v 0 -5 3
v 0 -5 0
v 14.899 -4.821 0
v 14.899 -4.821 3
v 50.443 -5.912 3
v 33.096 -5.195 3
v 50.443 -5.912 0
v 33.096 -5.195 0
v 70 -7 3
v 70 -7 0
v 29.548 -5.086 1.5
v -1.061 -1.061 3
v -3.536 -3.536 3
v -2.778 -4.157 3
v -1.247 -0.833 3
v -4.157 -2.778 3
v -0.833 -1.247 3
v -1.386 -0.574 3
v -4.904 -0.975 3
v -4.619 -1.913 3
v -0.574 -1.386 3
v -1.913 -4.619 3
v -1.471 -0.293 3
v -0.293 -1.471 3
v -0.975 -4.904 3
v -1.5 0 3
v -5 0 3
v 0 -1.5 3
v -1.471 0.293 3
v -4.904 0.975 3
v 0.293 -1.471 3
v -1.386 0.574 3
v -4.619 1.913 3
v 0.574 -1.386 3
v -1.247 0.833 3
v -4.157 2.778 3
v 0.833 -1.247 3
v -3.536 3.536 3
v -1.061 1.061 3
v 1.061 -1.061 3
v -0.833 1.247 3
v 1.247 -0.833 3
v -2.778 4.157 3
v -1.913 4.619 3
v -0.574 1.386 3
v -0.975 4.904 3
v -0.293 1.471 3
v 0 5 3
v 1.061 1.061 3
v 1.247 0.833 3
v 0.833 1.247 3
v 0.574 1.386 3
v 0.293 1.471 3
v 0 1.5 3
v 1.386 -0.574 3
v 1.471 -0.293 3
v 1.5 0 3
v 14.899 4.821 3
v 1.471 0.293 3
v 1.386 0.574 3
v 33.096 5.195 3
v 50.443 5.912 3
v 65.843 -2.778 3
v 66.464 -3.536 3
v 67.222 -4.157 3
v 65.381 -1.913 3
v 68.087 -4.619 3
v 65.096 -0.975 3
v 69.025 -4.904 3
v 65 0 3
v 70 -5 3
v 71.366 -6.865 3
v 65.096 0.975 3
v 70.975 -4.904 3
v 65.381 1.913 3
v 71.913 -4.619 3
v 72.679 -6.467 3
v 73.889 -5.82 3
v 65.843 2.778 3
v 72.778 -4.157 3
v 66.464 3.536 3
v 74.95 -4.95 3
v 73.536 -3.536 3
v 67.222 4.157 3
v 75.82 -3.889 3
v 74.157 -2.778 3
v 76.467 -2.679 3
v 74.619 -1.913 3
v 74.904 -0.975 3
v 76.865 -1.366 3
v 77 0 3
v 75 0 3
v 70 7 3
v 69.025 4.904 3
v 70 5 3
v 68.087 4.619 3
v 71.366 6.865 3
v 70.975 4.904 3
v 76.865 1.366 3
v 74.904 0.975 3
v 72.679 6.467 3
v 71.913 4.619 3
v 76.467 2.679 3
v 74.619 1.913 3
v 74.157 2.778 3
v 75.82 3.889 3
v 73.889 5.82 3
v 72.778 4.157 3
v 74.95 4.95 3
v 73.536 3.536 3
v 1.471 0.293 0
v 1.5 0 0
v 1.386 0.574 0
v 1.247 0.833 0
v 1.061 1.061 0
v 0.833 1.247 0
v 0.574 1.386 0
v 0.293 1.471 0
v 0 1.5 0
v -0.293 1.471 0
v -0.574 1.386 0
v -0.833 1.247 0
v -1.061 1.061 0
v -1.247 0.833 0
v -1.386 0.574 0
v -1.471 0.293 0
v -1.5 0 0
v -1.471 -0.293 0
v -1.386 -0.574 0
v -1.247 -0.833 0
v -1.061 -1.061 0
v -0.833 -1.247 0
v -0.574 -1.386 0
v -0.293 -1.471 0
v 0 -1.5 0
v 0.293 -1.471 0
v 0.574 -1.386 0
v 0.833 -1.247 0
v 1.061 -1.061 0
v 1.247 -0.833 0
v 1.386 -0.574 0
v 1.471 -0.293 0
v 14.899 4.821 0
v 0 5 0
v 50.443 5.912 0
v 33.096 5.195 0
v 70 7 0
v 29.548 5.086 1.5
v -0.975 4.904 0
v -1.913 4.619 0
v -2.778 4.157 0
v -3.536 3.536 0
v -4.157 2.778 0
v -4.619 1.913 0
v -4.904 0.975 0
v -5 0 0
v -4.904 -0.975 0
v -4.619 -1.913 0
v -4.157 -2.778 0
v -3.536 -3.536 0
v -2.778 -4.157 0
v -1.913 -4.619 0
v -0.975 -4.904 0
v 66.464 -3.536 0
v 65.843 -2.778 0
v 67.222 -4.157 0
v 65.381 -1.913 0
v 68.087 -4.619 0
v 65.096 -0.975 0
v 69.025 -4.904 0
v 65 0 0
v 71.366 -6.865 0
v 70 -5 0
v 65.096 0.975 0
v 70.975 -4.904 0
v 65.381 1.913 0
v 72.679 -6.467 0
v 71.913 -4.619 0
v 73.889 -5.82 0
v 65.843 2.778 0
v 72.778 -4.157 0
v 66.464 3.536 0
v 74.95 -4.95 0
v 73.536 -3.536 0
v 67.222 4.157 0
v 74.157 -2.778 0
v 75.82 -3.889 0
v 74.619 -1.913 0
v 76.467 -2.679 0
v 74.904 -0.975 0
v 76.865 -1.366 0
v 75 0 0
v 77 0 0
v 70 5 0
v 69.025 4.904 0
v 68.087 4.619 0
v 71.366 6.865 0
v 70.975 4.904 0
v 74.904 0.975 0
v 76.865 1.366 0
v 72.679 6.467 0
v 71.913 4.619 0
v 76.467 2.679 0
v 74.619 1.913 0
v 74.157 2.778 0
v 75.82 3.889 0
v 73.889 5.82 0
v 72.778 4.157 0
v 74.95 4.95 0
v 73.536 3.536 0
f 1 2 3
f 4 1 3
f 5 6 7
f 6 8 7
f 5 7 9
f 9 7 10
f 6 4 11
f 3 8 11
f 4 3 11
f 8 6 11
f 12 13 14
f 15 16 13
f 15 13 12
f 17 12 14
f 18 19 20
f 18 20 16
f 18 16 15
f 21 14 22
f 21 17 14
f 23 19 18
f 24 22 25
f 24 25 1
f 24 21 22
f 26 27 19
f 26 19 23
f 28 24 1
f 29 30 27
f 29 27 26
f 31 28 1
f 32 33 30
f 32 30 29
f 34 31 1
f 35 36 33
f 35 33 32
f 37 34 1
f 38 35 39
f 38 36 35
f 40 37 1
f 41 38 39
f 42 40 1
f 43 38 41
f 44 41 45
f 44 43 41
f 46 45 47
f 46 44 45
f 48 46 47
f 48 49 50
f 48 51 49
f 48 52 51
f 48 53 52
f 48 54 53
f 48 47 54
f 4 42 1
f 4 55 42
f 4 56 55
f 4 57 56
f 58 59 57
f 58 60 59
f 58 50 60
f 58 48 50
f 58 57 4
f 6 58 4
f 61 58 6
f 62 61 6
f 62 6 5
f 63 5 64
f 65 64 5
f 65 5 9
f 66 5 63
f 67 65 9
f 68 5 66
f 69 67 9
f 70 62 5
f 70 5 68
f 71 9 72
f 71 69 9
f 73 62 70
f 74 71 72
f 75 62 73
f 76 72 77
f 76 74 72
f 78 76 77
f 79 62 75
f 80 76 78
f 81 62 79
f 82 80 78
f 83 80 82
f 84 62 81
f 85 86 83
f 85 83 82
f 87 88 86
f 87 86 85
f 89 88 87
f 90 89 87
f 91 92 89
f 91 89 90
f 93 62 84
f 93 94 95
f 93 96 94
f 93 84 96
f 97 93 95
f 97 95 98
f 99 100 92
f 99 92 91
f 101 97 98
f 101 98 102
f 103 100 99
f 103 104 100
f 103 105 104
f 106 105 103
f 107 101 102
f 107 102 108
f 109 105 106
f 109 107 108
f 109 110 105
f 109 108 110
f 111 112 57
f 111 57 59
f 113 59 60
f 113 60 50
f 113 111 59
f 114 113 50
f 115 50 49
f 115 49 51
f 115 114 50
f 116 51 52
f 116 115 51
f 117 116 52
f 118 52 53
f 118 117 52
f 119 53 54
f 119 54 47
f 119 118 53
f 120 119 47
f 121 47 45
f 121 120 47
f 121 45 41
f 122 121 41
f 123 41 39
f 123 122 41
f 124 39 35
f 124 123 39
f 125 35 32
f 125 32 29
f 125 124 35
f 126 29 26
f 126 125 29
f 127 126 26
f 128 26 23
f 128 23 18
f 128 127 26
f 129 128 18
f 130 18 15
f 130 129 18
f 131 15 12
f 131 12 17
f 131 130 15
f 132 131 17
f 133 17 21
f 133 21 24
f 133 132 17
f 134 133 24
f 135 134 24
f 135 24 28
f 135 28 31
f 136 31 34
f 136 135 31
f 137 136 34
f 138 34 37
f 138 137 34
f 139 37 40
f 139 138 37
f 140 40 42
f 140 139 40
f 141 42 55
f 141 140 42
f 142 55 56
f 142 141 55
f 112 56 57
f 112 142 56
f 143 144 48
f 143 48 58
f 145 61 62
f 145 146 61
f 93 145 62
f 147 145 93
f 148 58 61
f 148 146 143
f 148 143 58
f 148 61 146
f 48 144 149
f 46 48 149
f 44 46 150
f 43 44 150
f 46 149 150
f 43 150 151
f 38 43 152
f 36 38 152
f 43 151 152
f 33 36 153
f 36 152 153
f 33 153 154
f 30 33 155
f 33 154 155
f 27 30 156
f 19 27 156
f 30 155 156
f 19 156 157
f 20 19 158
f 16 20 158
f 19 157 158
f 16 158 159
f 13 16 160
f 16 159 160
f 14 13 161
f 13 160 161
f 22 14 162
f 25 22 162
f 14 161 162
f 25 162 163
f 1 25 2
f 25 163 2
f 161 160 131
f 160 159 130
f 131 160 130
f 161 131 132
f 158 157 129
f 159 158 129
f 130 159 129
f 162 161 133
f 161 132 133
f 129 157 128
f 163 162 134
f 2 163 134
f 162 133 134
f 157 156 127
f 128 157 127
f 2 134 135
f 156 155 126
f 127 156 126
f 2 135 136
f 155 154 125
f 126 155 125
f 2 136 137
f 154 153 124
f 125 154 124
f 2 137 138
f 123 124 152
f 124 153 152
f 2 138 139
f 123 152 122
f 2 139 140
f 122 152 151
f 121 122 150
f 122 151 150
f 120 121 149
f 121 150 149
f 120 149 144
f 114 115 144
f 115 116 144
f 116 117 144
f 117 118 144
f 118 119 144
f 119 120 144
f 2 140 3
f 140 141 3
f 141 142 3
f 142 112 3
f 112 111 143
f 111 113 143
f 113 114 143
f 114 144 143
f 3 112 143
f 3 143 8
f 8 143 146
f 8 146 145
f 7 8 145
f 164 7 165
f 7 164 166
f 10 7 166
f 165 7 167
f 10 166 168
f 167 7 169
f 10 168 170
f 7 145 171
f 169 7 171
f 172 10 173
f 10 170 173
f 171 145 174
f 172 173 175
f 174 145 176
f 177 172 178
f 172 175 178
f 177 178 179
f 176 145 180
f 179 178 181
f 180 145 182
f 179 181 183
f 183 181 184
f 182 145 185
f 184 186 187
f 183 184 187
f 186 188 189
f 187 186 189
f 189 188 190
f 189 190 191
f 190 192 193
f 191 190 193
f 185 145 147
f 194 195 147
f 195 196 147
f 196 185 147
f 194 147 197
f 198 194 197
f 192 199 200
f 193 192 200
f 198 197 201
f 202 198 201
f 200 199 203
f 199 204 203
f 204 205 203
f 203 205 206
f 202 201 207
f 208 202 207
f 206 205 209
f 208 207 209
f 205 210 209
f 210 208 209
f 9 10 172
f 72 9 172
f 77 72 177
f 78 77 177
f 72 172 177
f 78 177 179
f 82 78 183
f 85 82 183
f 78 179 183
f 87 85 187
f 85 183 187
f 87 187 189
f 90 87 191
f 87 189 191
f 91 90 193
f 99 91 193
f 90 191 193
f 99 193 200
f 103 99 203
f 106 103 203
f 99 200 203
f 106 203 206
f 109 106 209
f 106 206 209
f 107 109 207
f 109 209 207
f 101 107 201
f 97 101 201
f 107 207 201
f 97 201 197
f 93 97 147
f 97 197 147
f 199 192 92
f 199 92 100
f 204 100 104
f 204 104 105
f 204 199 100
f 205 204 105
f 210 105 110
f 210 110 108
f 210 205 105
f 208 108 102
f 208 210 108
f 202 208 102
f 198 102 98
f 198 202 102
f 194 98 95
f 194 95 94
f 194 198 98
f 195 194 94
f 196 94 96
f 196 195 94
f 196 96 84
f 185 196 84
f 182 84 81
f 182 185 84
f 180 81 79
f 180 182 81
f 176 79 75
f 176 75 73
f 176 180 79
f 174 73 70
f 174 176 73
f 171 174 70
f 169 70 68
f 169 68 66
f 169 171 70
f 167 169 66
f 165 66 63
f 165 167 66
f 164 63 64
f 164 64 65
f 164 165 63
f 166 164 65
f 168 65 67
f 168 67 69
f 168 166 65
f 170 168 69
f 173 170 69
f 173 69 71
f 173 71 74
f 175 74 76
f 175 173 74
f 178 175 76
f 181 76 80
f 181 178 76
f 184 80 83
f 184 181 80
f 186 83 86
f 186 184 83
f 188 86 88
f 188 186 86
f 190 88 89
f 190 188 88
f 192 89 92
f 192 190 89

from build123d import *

# Parameters (mm, degrees)
SKETCH_1_R      = 5
SKETCH_1_R_2    = 1.5
EXTRUDE_2_DEPTH = 3


with BuildPart() as part:
    # 草图1 → 凸台-拉伸2 (new body)
    with BuildSketch(Plane.XY):
        with BuildLine():
            ThreePointArc((0, 5), (-5, 0), (0, -5))
            add(Edge.make_bspline(
                [(0, -5), (24.095302235, -4.17152905), (70, -7)],
                knots=[0, 0, 0, 1, 1, 1], degree=2))
            ThreePointArc((70, -7), (77, 0), (70, 7))
            add(Edge.make_bspline(
                [(0, 5), (24.095302235, 4.17152905), (70, 7)],
                knots=[0, 0, 0, 1, 1, 1], degree=2))
        make_face()
        with Locations((70, 0)):
            Circle(SKETCH_1_R, mode=Mode.SUBTRACT)
        Circle(SKETCH_1_R_2, mode=Mode.SUBTRACT)
    extrude(amount=EXTRUDE_2_DEPTH)


solid = part.part
